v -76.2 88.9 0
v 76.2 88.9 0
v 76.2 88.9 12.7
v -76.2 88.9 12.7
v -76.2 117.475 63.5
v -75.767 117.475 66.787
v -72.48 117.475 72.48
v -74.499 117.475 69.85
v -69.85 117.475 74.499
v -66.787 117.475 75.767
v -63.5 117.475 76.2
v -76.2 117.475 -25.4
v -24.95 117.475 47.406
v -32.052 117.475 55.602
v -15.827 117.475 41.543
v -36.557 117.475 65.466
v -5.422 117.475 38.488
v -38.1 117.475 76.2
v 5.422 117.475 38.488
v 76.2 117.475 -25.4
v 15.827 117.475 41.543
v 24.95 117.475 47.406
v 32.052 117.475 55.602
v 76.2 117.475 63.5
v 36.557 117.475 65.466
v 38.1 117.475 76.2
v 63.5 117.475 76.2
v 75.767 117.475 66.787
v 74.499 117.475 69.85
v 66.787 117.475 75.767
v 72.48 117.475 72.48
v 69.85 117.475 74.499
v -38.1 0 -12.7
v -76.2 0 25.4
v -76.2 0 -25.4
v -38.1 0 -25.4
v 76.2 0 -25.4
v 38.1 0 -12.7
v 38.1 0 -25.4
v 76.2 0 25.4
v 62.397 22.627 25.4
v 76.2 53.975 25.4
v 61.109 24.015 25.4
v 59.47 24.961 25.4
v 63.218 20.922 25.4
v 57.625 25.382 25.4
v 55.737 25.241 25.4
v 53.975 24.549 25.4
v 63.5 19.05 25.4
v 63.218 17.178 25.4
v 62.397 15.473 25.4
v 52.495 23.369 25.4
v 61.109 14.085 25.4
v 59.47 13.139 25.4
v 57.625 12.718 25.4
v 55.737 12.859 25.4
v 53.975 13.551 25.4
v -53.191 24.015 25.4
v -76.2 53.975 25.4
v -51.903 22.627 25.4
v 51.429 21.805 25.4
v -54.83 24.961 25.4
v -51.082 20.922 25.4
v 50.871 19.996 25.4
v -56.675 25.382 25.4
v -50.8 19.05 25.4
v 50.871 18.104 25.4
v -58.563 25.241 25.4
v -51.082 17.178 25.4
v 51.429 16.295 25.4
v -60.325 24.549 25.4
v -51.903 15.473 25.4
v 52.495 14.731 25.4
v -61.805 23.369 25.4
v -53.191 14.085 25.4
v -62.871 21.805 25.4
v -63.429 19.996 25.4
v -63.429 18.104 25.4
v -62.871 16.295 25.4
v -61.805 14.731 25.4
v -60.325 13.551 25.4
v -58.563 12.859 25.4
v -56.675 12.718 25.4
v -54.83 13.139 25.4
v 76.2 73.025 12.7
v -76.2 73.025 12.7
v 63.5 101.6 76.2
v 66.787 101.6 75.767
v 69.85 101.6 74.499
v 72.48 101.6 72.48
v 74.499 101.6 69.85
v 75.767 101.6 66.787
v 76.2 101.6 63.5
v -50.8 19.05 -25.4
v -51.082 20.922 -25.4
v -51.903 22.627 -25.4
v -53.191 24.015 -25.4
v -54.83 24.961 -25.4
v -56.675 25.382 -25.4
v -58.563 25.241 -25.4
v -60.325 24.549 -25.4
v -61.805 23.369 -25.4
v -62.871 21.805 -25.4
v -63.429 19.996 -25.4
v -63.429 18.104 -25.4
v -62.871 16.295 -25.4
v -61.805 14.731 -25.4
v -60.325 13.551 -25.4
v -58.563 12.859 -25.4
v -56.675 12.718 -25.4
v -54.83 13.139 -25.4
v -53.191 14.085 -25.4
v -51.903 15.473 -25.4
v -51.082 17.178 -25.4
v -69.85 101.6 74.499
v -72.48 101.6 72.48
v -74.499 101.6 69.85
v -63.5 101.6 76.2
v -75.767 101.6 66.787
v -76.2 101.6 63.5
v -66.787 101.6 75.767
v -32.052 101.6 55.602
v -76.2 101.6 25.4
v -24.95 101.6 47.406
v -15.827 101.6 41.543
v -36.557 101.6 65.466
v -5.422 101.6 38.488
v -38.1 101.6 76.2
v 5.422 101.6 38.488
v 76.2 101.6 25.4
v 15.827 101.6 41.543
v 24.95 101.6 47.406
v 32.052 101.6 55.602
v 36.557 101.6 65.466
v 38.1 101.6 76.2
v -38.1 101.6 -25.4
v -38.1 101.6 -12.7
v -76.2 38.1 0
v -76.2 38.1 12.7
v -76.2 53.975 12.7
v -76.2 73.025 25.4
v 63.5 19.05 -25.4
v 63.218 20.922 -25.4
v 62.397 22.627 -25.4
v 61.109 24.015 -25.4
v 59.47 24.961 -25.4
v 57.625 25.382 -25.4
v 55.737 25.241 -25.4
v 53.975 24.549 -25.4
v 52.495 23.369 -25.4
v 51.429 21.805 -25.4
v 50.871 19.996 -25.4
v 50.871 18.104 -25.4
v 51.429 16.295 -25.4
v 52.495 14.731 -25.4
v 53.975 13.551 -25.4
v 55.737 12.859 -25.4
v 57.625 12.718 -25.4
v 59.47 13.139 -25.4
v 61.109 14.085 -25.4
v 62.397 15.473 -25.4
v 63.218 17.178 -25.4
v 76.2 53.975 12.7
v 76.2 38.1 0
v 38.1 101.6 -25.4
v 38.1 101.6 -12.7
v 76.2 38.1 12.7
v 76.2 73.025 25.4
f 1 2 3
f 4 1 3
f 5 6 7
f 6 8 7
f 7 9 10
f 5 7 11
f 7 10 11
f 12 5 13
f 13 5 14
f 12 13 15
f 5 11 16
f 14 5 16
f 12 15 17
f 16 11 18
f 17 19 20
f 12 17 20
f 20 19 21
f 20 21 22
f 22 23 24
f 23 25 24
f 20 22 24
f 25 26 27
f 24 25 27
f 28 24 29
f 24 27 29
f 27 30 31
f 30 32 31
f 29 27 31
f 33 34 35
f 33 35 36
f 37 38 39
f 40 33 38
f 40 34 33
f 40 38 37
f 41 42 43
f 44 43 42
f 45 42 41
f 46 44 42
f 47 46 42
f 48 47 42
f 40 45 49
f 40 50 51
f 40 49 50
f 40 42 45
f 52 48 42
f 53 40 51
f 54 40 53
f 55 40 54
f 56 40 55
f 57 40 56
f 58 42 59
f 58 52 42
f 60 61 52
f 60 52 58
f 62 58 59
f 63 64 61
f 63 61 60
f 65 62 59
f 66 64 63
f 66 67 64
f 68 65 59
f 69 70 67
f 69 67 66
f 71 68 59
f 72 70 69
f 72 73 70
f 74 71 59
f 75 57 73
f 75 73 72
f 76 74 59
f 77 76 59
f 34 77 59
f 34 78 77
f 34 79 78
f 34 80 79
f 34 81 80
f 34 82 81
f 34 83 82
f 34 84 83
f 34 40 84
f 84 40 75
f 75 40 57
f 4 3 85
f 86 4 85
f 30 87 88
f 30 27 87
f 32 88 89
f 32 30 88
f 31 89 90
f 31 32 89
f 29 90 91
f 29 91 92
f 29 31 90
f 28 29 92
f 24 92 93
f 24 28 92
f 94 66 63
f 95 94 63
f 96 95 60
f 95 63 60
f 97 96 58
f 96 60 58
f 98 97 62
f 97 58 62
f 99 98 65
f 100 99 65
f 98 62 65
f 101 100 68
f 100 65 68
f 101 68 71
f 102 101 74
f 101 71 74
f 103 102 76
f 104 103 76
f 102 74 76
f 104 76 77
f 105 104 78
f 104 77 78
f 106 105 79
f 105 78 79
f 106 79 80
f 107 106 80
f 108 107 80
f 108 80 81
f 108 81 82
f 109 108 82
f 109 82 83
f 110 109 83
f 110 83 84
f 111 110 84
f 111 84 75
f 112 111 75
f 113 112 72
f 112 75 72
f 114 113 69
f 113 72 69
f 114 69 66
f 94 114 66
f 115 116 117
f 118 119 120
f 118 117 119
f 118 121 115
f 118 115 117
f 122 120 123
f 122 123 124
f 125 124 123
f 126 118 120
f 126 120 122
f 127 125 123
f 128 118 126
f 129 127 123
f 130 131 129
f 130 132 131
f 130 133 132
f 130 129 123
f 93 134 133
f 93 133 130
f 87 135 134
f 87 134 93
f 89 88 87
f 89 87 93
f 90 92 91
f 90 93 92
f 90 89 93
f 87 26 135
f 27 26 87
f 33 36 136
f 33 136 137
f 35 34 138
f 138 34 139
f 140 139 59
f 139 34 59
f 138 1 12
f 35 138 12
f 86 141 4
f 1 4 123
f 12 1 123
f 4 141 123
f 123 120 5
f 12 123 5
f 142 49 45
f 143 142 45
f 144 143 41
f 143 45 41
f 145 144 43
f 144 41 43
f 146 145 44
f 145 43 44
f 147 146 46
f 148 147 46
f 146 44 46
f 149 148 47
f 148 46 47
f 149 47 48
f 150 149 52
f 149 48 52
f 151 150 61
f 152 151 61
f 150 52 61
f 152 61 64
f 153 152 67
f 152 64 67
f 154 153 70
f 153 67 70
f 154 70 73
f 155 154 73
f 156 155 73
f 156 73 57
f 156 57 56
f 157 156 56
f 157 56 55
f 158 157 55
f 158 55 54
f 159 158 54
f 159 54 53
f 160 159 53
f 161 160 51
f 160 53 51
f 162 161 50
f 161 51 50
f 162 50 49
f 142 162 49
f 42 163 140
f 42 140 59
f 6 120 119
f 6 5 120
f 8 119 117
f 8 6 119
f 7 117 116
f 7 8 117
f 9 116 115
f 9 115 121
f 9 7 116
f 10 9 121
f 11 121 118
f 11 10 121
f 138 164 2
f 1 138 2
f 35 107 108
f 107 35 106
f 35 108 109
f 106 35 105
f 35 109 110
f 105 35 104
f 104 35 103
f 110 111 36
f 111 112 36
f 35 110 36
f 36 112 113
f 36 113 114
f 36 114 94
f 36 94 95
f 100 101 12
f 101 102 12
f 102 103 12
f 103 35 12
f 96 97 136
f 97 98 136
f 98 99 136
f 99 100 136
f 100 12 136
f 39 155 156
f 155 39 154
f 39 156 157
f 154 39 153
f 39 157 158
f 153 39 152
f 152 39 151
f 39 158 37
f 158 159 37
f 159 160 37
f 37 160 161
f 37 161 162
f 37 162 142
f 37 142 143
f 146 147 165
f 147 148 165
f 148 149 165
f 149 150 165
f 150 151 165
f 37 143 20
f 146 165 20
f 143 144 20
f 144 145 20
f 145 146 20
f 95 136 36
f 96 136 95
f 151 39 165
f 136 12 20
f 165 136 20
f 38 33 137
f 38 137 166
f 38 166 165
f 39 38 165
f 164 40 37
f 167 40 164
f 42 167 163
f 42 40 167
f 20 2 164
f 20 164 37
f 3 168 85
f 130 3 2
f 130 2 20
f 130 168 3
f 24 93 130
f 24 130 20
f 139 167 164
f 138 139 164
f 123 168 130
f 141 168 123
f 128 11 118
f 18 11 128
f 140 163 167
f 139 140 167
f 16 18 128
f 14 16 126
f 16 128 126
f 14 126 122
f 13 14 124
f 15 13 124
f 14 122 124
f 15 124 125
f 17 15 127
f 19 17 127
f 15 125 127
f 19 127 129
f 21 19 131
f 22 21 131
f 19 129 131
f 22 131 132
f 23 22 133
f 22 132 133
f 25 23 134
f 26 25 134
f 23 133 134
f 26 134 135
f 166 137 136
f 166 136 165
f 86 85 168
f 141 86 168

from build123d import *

# Parameters (mm, degrees)
F1_DEPTH = 101.6
F2_W     = 19.05
F2_H     = 12.7
F3_DEPTH = 152.4
F4_R     = 6.35
F5_DEPTH = 50.8
F6_W     = 152.4
F6_H     = 15.875
F7_DEPTH = 50.8
F9_DEPTH = 15.875
F10_R    = 12.7


with BuildPart() as f1:
    # F0 (on Front) → F1 (new body)
    with BuildSketch(Plane.XZ):
        Polygon((76.2, 25.4), (-76.2, 25.4), (-76.2, -25.4), (-38.1, -25.4), (-38.1, -12.7), (38.1, -12.7), (38.1, -25.4), (76.2, -25.4), align=None)
    extrude(amount=-F1_DEPTH)

    # F2 (on face) → F3 (cut)
    with BuildSketch(Plane.YZ.offset(76.2)):
        Polygon((53.975, 12.7), (38.1, 12.7), (38.1, 0), (88.9, 0), (88.9, 12.7), (73.025, 12.7), align=None)
        with Locations((63.5, 19.05)):
            Rectangle(F2_W, F2_H)
    extrude(amount=-F3_DEPTH, mode=Mode.SUBTRACT)

    # F4 (on face) → F5 (cut, through all)
    with BuildSketch(Plane.XY.offset(25.4)):
        with Locations((57.15, 19.05)):
            Circle(F4_R)
        with Locations((-57.15, 19.05)):
            Circle(F4_R)
    extrude(amount=-F5_DEPTH, mode=Mode.SUBTRACT)

    # F6 (on face) → F7 (join, symmetric)
    with BuildSketch(Plane.XY.offset(25.4)):
        with Locations((0, 109.5375)):
            Rectangle(F6_W, F6_H)
    extrude(amount=F7_DEPTH, both=True)

    # F8 (on face) → F9 (cut, through all)
    with BuildSketch(Plane.XZ.offset(-101.6)):
        with BuildLine():
            Line((38.1, 76.2), (-38.1, 76.2))
            ThreePointArc((-38.1, 76.2), (0, 38.1), (38.1, 76.2))
        make_face()
    extrude(amount=-F9_DEPTH, mode=Mode.SUBTRACT)

    # F10
    f10_edges = [f1.edges().sort_by_distance(p)[0] for p in [
        (-76.2, 109.5375, 76.2),
        (76.2, 109.5375, 76.2),
    ]]
    fillet(f10_edges, radius=F10_R)


solid = f1.part
